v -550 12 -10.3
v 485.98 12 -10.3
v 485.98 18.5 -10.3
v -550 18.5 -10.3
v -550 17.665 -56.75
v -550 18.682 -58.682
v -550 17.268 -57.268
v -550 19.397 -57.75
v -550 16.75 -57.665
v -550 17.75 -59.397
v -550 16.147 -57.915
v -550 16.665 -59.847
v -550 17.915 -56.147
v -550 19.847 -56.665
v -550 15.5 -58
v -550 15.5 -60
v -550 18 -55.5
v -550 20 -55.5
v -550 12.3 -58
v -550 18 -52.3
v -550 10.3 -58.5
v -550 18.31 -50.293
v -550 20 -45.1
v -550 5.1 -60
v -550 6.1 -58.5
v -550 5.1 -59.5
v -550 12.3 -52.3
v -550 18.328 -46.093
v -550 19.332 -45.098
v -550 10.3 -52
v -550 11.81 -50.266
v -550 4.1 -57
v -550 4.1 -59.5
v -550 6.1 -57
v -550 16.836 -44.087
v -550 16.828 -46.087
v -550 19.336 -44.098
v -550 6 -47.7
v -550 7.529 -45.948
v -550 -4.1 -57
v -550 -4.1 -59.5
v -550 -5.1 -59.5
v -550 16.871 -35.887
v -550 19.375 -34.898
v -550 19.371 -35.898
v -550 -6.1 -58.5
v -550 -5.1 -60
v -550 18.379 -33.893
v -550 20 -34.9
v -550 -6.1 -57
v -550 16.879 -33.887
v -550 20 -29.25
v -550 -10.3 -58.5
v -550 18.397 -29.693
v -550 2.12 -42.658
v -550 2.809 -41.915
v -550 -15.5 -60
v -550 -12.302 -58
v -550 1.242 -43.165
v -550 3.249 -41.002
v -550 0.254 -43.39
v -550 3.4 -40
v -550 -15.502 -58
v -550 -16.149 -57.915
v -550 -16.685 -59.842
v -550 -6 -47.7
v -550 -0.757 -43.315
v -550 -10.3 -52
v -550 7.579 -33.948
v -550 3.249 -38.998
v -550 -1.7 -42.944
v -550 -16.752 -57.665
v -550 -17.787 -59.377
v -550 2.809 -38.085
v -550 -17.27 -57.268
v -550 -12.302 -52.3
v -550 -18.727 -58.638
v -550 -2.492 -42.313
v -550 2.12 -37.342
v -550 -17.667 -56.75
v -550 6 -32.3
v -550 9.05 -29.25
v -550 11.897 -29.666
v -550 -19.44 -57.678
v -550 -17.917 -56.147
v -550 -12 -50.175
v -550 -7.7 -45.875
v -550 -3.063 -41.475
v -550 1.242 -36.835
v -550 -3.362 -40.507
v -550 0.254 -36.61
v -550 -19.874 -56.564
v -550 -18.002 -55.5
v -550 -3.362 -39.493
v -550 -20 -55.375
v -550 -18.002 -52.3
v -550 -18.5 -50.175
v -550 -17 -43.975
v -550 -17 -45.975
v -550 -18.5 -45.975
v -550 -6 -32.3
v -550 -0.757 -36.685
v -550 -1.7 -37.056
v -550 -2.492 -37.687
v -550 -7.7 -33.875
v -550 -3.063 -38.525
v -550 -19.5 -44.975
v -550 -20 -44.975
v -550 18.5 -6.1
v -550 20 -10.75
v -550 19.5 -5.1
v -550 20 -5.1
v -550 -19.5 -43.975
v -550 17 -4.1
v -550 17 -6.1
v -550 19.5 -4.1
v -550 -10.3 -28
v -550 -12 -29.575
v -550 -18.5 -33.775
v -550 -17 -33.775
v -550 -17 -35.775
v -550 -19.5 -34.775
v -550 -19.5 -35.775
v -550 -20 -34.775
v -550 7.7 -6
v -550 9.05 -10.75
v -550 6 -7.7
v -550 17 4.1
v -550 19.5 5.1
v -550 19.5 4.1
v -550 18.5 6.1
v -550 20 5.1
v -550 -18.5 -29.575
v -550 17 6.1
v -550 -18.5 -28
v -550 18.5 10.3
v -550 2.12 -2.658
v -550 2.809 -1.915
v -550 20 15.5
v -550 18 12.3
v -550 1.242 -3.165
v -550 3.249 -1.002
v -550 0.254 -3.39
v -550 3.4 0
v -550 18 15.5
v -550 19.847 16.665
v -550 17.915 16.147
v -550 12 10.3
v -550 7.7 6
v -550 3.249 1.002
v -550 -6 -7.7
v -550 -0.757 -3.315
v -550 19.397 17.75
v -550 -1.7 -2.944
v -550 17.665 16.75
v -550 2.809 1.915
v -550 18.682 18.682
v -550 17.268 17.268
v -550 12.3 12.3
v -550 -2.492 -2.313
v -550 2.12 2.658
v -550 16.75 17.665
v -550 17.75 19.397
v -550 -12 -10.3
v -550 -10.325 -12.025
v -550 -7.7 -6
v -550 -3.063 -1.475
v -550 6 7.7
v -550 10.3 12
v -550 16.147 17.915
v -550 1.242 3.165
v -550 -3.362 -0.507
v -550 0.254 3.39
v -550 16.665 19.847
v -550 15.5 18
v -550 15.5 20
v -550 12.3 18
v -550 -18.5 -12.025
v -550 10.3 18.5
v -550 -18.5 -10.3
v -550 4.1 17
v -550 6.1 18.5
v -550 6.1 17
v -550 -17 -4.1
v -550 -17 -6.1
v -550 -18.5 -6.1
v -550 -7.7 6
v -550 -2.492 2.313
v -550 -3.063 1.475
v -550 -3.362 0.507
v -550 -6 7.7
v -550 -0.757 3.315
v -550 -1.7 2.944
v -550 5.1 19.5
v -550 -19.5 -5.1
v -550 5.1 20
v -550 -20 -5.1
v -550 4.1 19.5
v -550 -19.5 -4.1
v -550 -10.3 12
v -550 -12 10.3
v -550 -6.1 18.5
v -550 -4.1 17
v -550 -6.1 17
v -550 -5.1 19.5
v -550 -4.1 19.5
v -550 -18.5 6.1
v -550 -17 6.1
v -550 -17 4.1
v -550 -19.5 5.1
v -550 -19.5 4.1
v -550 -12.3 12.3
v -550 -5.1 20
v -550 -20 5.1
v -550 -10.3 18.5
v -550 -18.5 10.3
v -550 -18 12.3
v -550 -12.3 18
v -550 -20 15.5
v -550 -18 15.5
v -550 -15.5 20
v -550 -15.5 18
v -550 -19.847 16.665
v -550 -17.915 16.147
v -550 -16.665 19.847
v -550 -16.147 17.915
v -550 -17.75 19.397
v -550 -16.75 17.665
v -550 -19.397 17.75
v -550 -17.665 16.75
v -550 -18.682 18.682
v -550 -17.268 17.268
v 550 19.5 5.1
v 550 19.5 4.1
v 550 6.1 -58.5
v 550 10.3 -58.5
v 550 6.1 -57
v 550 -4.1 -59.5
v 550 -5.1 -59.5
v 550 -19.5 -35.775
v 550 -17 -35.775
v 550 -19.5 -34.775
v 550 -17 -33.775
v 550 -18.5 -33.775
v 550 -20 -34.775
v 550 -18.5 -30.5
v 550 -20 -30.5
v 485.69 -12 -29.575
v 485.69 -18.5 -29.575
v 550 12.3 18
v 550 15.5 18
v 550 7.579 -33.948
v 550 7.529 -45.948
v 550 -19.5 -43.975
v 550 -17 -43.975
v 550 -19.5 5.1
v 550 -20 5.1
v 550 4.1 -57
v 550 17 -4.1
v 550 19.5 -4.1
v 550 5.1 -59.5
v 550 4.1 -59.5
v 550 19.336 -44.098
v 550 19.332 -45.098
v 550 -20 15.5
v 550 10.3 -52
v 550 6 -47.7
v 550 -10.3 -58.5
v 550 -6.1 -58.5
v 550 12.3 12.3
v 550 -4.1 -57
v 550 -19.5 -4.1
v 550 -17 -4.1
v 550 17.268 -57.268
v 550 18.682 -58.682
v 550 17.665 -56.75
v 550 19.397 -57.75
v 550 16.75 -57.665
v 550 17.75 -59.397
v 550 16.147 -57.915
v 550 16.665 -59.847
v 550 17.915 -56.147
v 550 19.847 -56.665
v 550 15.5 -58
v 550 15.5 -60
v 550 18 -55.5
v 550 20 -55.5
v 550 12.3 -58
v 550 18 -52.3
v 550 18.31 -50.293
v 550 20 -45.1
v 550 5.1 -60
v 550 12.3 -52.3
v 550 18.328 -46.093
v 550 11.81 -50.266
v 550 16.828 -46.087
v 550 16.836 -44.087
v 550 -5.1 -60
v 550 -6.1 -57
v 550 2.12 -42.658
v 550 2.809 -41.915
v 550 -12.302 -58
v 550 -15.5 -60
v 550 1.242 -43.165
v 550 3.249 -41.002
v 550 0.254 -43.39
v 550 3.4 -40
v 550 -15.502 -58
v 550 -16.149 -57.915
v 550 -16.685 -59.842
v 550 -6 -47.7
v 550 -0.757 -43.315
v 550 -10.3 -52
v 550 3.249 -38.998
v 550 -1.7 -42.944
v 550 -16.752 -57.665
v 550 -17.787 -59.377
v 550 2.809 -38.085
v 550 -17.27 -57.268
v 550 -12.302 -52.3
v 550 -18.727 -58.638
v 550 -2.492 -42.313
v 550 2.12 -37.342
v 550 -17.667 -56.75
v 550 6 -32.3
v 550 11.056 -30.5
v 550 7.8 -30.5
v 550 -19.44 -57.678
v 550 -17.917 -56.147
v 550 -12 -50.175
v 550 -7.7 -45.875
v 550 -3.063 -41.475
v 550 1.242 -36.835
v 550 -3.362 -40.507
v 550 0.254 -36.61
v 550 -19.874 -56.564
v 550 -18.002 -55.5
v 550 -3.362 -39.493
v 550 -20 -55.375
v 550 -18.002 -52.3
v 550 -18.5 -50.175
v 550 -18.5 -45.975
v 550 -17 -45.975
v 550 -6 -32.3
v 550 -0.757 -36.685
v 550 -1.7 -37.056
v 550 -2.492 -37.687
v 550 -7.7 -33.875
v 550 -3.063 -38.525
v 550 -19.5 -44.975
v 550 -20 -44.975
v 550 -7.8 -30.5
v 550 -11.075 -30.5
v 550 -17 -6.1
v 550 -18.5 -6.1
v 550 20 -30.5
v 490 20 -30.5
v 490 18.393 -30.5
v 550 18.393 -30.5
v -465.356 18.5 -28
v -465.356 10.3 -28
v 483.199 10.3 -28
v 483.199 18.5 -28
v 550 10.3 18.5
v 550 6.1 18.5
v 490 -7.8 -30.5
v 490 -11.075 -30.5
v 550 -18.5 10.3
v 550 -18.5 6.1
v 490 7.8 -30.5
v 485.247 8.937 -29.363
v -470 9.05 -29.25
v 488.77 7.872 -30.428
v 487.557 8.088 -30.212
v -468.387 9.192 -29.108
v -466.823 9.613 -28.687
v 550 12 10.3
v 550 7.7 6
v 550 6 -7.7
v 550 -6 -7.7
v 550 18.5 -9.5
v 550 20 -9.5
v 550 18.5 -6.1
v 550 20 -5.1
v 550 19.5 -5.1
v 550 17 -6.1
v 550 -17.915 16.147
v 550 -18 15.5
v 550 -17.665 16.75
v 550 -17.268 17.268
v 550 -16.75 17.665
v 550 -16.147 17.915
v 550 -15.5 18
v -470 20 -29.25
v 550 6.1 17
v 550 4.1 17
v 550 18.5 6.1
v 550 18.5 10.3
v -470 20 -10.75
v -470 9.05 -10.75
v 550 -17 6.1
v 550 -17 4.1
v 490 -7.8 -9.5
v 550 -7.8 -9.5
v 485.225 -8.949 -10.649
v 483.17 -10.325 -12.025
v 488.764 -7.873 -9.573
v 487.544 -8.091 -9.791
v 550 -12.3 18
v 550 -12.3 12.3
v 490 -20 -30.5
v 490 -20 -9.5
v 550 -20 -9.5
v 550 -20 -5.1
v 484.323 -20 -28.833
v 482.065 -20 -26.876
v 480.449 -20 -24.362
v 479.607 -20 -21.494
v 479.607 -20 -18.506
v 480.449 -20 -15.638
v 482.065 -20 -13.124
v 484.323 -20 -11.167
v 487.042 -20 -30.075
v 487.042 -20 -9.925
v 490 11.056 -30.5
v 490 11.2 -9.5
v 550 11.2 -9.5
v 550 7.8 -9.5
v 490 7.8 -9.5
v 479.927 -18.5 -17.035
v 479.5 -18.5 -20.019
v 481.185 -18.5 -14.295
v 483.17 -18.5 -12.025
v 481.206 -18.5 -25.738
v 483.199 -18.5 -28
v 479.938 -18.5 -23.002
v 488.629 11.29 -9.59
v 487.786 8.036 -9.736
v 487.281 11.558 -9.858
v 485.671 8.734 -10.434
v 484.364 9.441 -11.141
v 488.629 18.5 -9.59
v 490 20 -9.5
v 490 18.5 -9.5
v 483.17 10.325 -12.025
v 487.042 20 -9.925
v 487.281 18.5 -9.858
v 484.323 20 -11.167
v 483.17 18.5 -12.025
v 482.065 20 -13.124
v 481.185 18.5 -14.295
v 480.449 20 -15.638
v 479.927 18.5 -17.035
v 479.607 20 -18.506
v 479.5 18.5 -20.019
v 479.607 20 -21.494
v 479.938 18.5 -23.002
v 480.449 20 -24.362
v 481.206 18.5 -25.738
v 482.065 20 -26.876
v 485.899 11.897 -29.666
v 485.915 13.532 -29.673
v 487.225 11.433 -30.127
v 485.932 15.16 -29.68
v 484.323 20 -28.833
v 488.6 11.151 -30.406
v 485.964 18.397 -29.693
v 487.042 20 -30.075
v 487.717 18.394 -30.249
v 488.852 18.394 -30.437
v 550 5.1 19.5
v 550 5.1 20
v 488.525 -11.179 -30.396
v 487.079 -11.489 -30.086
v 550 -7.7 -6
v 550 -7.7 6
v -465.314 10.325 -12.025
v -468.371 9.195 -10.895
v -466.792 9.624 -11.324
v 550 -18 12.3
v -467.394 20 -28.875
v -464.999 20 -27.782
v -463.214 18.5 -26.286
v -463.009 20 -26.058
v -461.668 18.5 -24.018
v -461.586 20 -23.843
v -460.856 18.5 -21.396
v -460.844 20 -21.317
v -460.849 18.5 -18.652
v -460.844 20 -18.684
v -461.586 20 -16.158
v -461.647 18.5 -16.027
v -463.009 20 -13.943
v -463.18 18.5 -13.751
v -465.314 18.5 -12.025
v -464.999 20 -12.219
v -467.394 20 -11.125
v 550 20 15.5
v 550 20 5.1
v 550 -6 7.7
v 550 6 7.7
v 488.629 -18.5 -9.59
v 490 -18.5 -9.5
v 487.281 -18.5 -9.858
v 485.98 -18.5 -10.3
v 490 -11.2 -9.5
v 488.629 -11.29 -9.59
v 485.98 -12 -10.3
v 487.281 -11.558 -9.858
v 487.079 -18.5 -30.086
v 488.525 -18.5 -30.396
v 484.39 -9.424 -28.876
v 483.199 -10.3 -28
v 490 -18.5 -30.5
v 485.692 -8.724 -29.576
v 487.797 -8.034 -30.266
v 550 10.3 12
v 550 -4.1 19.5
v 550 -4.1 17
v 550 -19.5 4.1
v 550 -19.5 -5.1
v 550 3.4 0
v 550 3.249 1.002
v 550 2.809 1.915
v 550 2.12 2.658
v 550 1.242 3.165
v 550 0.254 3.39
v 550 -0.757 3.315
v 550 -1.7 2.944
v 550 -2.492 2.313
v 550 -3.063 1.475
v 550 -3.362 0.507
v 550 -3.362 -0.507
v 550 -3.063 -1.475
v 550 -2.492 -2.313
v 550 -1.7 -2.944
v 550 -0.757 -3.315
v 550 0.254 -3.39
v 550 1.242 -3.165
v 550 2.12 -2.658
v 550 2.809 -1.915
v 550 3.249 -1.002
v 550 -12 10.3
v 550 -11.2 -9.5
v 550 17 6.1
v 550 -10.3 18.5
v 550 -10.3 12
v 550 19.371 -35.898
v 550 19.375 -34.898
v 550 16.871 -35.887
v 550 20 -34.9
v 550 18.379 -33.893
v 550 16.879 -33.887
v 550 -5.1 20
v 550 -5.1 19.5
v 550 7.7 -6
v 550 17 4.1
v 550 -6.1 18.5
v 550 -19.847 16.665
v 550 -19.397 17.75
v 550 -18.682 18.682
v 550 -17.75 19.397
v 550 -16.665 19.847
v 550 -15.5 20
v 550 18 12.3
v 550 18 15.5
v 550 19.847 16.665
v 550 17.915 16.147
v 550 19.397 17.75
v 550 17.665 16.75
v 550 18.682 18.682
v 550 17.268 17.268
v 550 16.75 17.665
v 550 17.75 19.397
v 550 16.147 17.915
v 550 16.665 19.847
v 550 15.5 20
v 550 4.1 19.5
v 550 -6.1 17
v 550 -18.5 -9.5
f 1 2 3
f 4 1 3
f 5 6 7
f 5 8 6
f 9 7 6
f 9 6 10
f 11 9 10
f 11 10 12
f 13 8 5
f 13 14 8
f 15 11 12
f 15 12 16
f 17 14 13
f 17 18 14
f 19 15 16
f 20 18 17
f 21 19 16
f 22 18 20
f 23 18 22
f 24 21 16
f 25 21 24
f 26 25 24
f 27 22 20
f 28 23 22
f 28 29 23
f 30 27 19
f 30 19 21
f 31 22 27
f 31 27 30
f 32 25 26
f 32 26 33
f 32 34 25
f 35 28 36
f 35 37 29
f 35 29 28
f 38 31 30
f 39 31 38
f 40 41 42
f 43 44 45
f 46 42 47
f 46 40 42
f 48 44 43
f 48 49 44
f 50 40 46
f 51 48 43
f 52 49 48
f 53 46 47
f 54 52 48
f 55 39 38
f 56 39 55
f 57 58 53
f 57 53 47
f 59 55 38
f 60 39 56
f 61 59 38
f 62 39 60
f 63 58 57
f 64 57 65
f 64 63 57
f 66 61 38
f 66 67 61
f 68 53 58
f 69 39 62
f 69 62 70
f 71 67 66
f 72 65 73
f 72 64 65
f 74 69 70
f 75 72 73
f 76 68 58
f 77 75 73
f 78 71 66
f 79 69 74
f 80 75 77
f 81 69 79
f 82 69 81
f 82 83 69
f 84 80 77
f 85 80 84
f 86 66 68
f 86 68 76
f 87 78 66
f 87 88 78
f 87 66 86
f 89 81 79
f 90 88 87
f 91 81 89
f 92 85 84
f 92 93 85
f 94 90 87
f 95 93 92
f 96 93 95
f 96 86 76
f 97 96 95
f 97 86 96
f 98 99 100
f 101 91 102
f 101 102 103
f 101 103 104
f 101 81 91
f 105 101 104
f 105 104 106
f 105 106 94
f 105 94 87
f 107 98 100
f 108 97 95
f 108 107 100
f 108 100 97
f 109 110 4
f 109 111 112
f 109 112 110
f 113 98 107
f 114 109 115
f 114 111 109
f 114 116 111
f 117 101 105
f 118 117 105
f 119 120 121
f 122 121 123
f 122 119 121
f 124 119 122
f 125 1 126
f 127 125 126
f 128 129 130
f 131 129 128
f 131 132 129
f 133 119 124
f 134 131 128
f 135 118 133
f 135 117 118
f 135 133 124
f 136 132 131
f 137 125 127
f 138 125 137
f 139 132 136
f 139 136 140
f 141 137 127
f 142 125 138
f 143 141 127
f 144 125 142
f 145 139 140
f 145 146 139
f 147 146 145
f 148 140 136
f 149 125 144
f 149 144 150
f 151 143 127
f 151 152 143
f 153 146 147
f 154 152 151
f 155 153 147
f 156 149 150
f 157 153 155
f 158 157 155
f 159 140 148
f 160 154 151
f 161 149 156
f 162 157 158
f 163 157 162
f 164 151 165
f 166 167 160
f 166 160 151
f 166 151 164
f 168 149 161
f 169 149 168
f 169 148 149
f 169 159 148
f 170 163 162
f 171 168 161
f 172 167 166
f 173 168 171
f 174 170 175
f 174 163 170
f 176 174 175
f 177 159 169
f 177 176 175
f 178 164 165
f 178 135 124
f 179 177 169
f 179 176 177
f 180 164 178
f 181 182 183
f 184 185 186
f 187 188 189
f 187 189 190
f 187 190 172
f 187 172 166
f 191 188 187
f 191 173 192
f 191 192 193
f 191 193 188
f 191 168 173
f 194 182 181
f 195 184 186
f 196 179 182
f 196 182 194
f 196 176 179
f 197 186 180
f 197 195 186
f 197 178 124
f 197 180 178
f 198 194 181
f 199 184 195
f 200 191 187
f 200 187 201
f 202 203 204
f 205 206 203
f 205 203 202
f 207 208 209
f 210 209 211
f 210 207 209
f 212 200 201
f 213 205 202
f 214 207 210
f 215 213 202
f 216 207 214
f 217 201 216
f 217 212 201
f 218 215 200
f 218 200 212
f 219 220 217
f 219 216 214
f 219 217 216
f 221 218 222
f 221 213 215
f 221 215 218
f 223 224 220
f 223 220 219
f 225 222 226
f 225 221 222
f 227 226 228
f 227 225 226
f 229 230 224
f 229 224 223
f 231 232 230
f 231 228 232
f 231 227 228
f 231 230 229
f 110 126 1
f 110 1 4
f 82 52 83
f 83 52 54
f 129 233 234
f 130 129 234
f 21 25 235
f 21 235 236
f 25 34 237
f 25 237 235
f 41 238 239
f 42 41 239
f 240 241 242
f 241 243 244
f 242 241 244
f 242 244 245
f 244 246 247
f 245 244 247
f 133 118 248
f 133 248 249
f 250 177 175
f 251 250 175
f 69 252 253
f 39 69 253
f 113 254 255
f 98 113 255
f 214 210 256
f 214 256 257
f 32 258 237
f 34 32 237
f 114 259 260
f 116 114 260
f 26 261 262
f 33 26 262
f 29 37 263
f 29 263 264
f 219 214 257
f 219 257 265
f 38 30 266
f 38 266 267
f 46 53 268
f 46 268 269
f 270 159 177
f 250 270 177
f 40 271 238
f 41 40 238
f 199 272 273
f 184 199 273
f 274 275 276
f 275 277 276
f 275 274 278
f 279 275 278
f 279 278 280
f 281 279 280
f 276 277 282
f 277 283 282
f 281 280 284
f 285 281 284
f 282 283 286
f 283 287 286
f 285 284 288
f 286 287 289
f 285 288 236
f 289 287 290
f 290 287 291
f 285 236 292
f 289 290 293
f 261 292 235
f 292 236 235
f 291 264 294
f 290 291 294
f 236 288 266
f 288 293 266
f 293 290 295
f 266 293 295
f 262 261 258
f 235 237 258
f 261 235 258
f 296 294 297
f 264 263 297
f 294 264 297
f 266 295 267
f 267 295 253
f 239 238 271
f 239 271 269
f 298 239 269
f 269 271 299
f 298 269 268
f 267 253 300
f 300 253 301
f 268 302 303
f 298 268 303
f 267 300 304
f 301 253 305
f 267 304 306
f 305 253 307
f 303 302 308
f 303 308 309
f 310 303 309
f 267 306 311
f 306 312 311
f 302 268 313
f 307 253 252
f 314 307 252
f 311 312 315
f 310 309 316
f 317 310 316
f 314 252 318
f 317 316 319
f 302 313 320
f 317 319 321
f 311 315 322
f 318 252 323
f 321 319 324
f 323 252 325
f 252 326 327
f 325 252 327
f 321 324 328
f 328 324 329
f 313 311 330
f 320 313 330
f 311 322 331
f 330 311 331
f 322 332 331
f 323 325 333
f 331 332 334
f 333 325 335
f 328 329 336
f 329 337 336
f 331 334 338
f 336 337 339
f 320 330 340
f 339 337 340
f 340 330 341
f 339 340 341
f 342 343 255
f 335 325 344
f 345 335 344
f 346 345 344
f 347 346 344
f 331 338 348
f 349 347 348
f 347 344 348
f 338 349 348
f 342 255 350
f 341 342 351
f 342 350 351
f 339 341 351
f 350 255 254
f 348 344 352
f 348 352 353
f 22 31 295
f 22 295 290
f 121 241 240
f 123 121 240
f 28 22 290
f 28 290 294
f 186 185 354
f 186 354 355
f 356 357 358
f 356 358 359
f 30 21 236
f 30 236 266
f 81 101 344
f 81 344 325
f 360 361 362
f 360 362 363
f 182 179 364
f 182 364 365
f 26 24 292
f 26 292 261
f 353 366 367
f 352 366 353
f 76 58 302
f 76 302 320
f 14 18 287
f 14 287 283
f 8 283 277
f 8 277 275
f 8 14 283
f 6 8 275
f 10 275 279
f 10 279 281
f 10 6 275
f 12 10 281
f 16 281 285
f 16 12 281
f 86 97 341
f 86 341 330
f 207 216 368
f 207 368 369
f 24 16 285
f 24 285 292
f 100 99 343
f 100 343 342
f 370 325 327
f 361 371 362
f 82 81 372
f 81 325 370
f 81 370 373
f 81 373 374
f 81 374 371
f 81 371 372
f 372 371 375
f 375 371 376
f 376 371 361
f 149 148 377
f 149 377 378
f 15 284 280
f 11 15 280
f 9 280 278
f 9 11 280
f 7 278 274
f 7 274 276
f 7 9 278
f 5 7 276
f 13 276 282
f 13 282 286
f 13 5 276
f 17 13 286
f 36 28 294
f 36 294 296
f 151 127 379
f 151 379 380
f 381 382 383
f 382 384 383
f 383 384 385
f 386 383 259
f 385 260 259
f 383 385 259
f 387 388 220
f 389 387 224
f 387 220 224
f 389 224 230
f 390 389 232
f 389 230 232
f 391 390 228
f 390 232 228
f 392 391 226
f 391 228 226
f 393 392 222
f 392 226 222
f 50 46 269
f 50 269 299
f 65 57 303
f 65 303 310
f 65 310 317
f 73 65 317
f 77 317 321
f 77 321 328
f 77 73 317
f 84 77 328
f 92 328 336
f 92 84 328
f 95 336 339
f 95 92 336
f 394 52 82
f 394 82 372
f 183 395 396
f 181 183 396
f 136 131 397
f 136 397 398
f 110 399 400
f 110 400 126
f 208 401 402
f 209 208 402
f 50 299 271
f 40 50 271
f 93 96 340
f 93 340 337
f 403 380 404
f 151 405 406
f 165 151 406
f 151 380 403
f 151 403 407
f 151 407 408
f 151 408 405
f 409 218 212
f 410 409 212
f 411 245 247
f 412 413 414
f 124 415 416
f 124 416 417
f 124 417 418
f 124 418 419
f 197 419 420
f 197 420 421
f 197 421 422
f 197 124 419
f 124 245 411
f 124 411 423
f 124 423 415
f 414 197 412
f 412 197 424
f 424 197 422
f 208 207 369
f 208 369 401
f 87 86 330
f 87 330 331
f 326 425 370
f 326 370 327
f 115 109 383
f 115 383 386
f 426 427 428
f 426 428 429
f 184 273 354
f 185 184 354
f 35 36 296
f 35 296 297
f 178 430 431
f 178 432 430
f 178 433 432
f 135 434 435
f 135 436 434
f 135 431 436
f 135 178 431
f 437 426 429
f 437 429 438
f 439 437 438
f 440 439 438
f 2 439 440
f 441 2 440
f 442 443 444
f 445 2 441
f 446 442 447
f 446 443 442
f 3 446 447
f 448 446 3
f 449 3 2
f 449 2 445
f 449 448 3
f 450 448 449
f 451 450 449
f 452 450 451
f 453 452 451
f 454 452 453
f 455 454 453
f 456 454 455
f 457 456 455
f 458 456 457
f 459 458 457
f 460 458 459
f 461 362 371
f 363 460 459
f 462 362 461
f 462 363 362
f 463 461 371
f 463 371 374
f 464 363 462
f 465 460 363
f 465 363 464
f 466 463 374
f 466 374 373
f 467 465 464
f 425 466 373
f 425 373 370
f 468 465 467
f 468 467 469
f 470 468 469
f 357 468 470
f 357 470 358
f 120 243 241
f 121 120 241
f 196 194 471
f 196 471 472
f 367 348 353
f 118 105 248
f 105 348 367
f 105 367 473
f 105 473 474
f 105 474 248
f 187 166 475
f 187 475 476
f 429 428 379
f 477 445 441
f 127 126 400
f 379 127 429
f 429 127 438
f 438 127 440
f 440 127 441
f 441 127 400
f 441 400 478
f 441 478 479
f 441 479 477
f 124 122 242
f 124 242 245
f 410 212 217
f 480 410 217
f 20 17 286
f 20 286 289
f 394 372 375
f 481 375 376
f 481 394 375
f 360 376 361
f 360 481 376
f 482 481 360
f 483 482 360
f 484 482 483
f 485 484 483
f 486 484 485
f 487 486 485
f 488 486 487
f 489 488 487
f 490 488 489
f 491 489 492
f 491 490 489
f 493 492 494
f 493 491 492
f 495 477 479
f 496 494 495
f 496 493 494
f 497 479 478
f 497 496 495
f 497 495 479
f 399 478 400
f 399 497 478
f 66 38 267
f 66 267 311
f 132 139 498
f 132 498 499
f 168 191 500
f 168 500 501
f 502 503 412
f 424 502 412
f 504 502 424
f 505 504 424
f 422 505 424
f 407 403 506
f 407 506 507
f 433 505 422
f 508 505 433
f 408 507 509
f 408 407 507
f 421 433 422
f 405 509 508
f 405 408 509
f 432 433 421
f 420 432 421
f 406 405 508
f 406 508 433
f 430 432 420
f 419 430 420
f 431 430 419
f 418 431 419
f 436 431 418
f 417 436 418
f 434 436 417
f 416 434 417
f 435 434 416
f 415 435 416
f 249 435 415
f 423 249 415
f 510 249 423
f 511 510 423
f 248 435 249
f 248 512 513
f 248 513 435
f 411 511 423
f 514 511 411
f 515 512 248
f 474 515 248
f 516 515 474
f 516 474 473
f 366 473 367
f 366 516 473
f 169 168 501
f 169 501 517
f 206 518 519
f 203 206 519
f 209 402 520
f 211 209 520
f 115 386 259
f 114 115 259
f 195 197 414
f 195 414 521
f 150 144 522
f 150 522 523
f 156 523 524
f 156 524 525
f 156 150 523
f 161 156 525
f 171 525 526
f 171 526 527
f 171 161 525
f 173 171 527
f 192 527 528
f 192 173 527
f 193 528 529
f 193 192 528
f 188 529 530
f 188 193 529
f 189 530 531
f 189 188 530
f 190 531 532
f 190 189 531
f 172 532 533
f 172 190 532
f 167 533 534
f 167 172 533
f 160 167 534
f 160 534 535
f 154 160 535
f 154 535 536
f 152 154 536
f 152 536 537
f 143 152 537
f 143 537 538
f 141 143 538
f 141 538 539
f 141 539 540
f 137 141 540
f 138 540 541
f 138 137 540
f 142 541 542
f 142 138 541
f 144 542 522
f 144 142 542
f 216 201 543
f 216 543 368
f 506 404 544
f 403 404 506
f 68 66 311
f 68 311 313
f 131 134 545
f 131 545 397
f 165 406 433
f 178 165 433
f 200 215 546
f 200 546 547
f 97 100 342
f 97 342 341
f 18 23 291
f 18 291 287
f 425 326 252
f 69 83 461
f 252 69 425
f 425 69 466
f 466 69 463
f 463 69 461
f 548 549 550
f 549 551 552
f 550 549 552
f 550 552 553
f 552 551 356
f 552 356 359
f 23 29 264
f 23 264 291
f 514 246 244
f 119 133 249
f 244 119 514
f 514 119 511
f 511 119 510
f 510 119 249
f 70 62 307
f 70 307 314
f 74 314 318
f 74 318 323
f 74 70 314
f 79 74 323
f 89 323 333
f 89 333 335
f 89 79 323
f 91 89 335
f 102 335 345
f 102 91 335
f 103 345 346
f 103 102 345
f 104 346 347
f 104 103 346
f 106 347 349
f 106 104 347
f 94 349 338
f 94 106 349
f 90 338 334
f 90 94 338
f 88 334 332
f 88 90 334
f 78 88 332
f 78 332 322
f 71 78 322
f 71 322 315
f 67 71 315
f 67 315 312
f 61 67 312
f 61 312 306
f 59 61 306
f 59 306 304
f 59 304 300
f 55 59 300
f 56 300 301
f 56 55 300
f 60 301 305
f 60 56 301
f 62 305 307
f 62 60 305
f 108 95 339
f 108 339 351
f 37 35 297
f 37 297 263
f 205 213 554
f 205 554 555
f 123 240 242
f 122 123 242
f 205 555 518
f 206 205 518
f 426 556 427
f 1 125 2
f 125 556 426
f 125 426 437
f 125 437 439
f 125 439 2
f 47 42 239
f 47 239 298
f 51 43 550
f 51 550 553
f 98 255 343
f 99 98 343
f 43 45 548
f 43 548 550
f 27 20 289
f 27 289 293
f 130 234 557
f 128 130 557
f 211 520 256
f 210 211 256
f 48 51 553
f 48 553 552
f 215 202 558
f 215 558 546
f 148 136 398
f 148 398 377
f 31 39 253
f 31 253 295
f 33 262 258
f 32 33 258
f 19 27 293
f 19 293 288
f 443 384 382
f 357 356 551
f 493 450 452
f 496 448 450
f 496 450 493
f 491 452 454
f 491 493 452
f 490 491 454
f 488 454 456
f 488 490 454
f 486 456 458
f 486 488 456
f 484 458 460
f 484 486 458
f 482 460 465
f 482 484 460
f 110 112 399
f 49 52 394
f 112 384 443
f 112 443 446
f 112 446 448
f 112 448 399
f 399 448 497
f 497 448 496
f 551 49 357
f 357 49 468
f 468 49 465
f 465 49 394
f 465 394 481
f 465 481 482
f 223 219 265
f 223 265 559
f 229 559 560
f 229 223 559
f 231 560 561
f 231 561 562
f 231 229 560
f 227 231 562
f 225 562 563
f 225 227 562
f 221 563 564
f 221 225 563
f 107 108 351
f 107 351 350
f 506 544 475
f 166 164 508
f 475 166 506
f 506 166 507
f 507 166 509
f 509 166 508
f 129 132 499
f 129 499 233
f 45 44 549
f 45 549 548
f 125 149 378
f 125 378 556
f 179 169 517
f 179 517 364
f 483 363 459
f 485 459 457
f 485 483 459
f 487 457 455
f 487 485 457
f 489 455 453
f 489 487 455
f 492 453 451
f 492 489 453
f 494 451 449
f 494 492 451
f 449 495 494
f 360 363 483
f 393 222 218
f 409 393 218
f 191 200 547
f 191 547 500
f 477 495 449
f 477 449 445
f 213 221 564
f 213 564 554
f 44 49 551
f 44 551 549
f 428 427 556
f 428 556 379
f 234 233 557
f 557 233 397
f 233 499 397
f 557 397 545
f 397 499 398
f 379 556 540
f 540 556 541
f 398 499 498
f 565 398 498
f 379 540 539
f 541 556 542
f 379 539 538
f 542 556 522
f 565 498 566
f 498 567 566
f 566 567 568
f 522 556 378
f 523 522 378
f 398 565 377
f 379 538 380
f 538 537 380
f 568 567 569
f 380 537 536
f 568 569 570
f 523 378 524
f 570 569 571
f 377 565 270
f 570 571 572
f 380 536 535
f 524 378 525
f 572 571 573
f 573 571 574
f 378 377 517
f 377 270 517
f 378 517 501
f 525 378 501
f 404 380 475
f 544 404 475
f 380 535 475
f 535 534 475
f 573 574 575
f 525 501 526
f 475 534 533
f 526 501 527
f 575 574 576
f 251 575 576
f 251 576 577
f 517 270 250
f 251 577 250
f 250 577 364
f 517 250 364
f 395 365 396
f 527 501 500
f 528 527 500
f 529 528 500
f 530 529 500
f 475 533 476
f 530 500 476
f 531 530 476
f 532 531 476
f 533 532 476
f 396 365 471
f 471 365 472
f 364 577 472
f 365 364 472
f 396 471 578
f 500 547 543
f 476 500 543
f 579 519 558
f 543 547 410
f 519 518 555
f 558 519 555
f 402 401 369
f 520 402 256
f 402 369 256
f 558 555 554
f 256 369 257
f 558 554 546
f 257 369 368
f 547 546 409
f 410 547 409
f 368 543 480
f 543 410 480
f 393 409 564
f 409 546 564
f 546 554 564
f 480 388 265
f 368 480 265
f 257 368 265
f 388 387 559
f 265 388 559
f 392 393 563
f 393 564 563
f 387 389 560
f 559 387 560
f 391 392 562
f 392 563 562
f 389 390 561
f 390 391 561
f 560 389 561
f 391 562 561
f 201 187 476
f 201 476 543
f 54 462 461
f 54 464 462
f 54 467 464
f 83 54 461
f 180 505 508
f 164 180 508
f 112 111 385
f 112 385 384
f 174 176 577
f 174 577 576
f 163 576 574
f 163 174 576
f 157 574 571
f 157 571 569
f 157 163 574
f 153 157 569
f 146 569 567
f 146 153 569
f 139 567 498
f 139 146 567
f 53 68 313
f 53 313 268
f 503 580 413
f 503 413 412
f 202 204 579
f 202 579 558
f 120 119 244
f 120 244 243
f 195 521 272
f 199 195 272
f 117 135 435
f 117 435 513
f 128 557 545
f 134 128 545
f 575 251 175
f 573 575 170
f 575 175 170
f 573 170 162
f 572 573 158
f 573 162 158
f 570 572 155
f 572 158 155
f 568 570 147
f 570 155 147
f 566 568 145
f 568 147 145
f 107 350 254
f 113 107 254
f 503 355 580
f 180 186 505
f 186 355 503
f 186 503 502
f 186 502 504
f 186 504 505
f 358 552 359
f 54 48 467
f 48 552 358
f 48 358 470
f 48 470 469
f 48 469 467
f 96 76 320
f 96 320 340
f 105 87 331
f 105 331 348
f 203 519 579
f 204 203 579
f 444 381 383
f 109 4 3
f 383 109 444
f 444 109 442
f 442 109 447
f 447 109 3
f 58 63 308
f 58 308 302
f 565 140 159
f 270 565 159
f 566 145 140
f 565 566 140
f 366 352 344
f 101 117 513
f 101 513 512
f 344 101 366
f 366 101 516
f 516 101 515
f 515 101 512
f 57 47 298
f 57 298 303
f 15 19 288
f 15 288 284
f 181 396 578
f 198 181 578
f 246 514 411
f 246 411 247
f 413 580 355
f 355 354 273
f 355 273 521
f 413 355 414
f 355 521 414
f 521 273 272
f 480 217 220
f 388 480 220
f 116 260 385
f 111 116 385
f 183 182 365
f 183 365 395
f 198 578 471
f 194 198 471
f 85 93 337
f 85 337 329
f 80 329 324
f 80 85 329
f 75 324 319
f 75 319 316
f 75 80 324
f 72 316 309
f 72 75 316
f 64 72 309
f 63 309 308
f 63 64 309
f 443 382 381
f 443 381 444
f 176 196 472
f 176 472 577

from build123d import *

# Parameters (mm, degrees)
SKETCH1_R                 = 3.4
F_40_X_80W_X_R4_5_1_DEPTH = 1100
CUT_EXTRUDE_1_REACH       = 556.707
CUT_EXTRUDE_2_DEPTH       = 555.707255189


with BuildPart() as part:
    # Sketch1 → 工业铝型材 40 X 80W X R4.5(1) (new body)
    with BuildSketch(Plane.YZ.offset(-550)):
        with BuildLine():
            Line((-5.1, 20), (-5.1, 19.5))
            Line((-5.1, 19.5), (-4.1, 19.5))
            Line((-4.1, 19.5), (-4.1, 17))
            Line((-4.1, 17), (-6.1, 17))
            Line((-6.1, 17), (-6.1, 18.5))
            Line((-6.1, 18.5), (-10.3, 18.5))
            Line((-10.3, 18.5), (-10.3, 12))
            Line((-10.3, 12), (-6, 7.7))
            Line((-6, 7.7), (6, 7.7))
            Line((6, 7.7), (10.3, 12))
            Line((10.3, 12), (10.3, 18.5))
            Line((10.3, 18.5), (6.1, 18.5))
            Line((6.1, 18.5), (6.1, 17))
            Line((6.1, 17), (4.1, 17))
            Line((4.1, 17), (4.1, 19.5))
            Line((4.1, 19.5), (5.1, 19.5))
            Line((5.1, 19.5), (5.1, 20))
            Line((5.1, 20), (15.5, 20))
            ThreePointArc((15.5, 20), (18.681980515, 18.681980515), (20, 15.5))
            Line((20, 15.5), (20, 5.1))
            Line((20, 5.1), (19.5, 5.1))
            Line((19.5, 5.1), (19.5, 4.1))
            Line((19.5, 4.1), (17, 4.1))
            Line((17, 4.1), (17, 6.1))
            Line((17, 6.1), (18.5, 6.1))
            Line((18.5, 6.1), (18.5, 10.3))
            Line((18.5, 10.3), (12, 10.3))
            Line((12, 10.3), (7.7, 6))
            Line((7.7, 6), (7.7, -6))
            Line((7.7, -6), (12, -10.3))
            Line((12, -10.3), (18.5, -10.3))
            Line((18.5, -10.3), (18.5, -6.1))
            Line((18.5, -6.1), (17, -6.1))
            Line((17, -6.1), (17, -4.1))
            Line((17, -4.1), (19.5, -4.1))
            Line((19.5, -4.1), (19.5, -5.1))
            Line((19.5, -5.1), (20, -5.1))
            Line((20, -5.1), (20, -34.900262163))
            Line((20, -34.900262163), (19.375005498, -34.897640542))
            Line((19.375005498, -34.897640542), (19.370810904, -35.897631745))
            Line((19.370810904, -35.897631745), (16.870832898, -35.88714526))
            Line((16.870832898, -35.88714526), (16.879222086, -33.887162854))
            Line((16.879222086, -33.887162854), (18.37920889, -33.893454745))
            Line((18.37920889, -33.893454745), (18.396826184, -29.693491694))
            Line((18.396826184, -29.693491694), (11.896883367, -29.666226833))
            Line((11.896883367, -29.666226833), (7.578884442, -33.948152251))
            Line((7.578884442, -33.948152251), (7.528549314, -45.948046683))
            Line((7.528549314, -45.948046683), (11.810474731, -50.266045608))
            Line((11.810474731, -50.266045608), (18.310417549, -50.293310469))
            Line((18.310417549, -50.293310469), (18.328034843, -46.093347418))
            Line((18.328034843, -46.093347418), (16.828048039, -46.087055527))
            Line((16.828048039, -46.087055527), (16.836437227, -44.087073122))
            Line((16.836437227, -44.087073122), (19.336415234, -44.097559606))
            Line((19.336415234, -44.097559606), (19.33222064, -45.097550809))
            Line((19.33222064, -45.097550809), (20, -45.100351897))
            Line((20, -45.100351897), (20, -55.5))
            ThreePointArc((20, -55.5), (18.681980515, -58.681980515), (15.5, -60))
            Line((15.5, -60), (5.1, -60))
            Line((5.1, -60), (5.1, -59.5))
            Line((5.1, -59.5), (4.1, -59.5))
            Line((4.1, -59.5), (4.1, -57))
            Line((4.1, -57), (6.1, -57))
            Line((6.1, -57), (6.1, -58.5))
            Line((6.1, -58.5), (10.3, -58.5))
            Line((10.3, -58.5), (10.3, -52))
            Line((10.3, -52), (6, -47.7))
            Line((6, -47.7), (-6, -47.7))
            Line((-6, -47.7), (-10.3, -52))
            Line((-10.3, -52), (-10.3, -58.5))
            Line((-10.3, -58.5), (-6.1, -58.5))
            Line((-6.1, -58.5), (-6.1, -57))
            Line((-6.1, -57), (-4.1, -57))
            Line((-4.1, -57), (-4.1, -59.5))
            Line((-4.1, -59.5), (-5.1, -59.5))
            Line((-5.1, -59.5), (-5.1, -60))
            Line((-5.1, -60), (-15.5, -60))
            ThreePointArc((-15.5, -60), (-18.727003145, -58.638097654), (-20, -55.375))
            Line((-20, -55.375), (-20, -44.975))
            Line((-20, -44.975), (-19.5, -44.975))
            Line((-19.5, -44.975), (-19.5, -43.975))
            Line((-19.5, -43.975), (-17, -43.975))
            Line((-17, -43.975), (-17, -45.975))
            Line((-17, -45.975), (-18.5, -45.975))
            Line((-18.5, -45.975), (-18.5, -50.175))
            Line((-18.5, -50.175), (-12, -50.175))
            Line((-12, -50.175), (-7.7, -45.875))
            Line((-7.7, -45.875), (-7.7, -33.875))
            Line((-7.7, -33.875), (-12, -29.575))
            Line((-12, -29.575), (-18.5, -29.575))
            Line((-18.5, -29.575), (-18.5, -33.775))
            Line((-18.5, -33.775), (-17, -33.775))
            Line((-17, -33.775), (-17, -35.775))
            Line((-17, -35.775), (-19.5, -35.775))
            Line((-19.5, -35.775), (-19.5, -34.775))
            Line((-19.5, -34.775), (-20, -34.775))
            Line((-20, -34.775), (-20, -5.1))
            Line((-20, -5.1), (-19.5, -5.1))
            Line((-19.5, -5.1), (-19.5, -4.1))
            Line((-19.5, -4.1), (-17, -4.1))
            Line((-17, -4.1), (-17, -6.1))
            Line((-17, -6.1), (-18.5, -6.1))
            Line((-18.5, -6.1), (-18.5, -10.3))
            Line((-18.5, -10.3), (-12, -10.3))
            Line((-12, -10.3), (-7.7, -6))
            Line((-7.7, -6), (-7.7, 6))
            Line((-7.7, 6), (-12, 10.3))
            Line((-12, 10.3), (-18.5, 10.3))
            Line((-18.5, 10.3), (-18.5, 6.1))
            Line((-18.5, 6.1), (-17, 6.1))
            Line((-17, 6.1), (-17, 4.1))
            Line((-17, 4.1), (-19.5, 4.1))
            Line((-19.5, 4.1), (-19.5, 5.1))
            Line((-19.5, 5.1), (-20, 5.1))
            Line((-20, 5.1), (-20, 15.5))
            ThreePointArc((-20, 15.5), (-18.681980515, 18.681980515), (-15.5, 20))
            Line((-15.5, 20), (-5.1, 20))
        make_face()
        Circle(SKETCH1_R, mode=Mode.SUBTRACT)
        with Locations((0, -40)):
            Circle(SKETCH1_R, mode=Mode.SUBTRACT)
        with BuildLine():
            Line((12.3, 18), (15.5, 18))
            ThreePointArc((15.5, 18), (17.267766953, 17.267766953), (18, 15.5))
            Line((18, 15.5), (18, 12.3))
            Line((18, 12.3), (12.3, 12.3))
            Line((12.3, 12.3), (12.3, 18))
        make_face(mode=Mode.SUBTRACT)
        Polygon((10.325, -12.025), (6, -7.7), (-6, -7.7), (-10.325, -12.025), (-18.5, -12.025), (-18.5, -28), (-10.3, -28), (-6, -32.3), (6, -32.3), (10.3, -28), (18.5, -28), (18.5, -12.025), align=None, mode=Mode.SUBTRACT)
        with BuildLine():
            Line((-15.5, 18), (-12.3, 18))
            Line((-12.3, 18), (-12.3, 12.3))
            Line((-12.3, 12.3), (-18, 12.3))
            Line((-18, 12.3), (-18, 15.5))
            ThreePointArc((-18, 15.5), (-17.267766953, 17.267766953), (-15.5, 18))
        make_face(mode=Mode.SUBTRACT)
        with BuildLine():
            Line((-12.301736455, -58.000000335), (-12.301736455, -52.300000335))
            Line((-12.301736455, -52.300000335), (-18.001736455, -52.300000335))
            Line((-18.001736455, -52.300000335), (-18.001736455, -55.500000335))
            ThreePointArc((-18.001736455, -55.500000335), (-17.269503408, -57.267767288), (-15.501736455, -58.000000335))
            Line((-15.501736455, -58.000000335), (-12.301736455, -58.000000335))
        make_face(mode=Mode.SUBTRACT)
        with BuildLine():
            Line((18, -55.5), (18, -52.3))
            Line((18, -52.3), (12.3, -52.3))
            Line((12.3, -52.3), (12.3, -58))
            Line((12.3, -58), (15.5, -58))
            ThreePointArc((15.5, -58), (17.267766953, -57.267766953), (18, -55.5))
        make_face(mode=Mode.SUBTRACT)
    extrude(amount=F_40_X_80W_X_R4_5_1_DEPTH)

    # 草图3 → 切除-拉伸1 (cut, up to next)
    with BuildSketch(Plane(origin=(0, 20, 0), x_dir=(1, 0, 0), z_dir=(0, 1, 0)), mode=Mode.PRIVATE) as cut_extrude_1_sk1:
        with BuildLine():
            Line((-550, 29.250131082), (-470, 29.250131082))
            ThreePointArc((-470, 29.250131082), (-460.75, 20.000131082), (-470, 10.750131082))
            Line((-470, 10.750131082), (-550, 10.750131082))
            ThreePointArc((-550, 10.750131082), (-559.25, 20.000131082), (-550, 29.250131082))
        make_face()
    cut_extrude_1_tool1 = extrude(cut_extrude_1_sk1.sketch, amount=-CUT_EXTRUDE_1_REACH, mode=Mode.PRIVATE) & part.part
    add(cut_extrude_1_tool1.solids().sort_by_distance((-510, 20, -20.000131))[0], mode=Mode.SUBTRACT)

    # 草图4 → 切除-拉伸2 (cut, through all)
    with BuildSketch(Plane(origin=(0, 20, 0), x_dir=(1, 0, 0), z_dir=(0, 1, 0))):
        with BuildLine():
            Line((550, 9.500131082), (490, 9.500131082))
            ThreePointArc((490, 9.500131082), (479.5, 20.000131082), (490, 30.500131082))
            Line((490, 30.500131082), (550, 30.500131082))
            ThreePointArc((550, 30.500131082), (560.5, 20.000131082), (550, 9.500131082))
        make_face()
    extrude(amount=-CUT_EXTRUDE_2_DEPTH, mode=Mode.SUBTRACT)


solid = part.part
